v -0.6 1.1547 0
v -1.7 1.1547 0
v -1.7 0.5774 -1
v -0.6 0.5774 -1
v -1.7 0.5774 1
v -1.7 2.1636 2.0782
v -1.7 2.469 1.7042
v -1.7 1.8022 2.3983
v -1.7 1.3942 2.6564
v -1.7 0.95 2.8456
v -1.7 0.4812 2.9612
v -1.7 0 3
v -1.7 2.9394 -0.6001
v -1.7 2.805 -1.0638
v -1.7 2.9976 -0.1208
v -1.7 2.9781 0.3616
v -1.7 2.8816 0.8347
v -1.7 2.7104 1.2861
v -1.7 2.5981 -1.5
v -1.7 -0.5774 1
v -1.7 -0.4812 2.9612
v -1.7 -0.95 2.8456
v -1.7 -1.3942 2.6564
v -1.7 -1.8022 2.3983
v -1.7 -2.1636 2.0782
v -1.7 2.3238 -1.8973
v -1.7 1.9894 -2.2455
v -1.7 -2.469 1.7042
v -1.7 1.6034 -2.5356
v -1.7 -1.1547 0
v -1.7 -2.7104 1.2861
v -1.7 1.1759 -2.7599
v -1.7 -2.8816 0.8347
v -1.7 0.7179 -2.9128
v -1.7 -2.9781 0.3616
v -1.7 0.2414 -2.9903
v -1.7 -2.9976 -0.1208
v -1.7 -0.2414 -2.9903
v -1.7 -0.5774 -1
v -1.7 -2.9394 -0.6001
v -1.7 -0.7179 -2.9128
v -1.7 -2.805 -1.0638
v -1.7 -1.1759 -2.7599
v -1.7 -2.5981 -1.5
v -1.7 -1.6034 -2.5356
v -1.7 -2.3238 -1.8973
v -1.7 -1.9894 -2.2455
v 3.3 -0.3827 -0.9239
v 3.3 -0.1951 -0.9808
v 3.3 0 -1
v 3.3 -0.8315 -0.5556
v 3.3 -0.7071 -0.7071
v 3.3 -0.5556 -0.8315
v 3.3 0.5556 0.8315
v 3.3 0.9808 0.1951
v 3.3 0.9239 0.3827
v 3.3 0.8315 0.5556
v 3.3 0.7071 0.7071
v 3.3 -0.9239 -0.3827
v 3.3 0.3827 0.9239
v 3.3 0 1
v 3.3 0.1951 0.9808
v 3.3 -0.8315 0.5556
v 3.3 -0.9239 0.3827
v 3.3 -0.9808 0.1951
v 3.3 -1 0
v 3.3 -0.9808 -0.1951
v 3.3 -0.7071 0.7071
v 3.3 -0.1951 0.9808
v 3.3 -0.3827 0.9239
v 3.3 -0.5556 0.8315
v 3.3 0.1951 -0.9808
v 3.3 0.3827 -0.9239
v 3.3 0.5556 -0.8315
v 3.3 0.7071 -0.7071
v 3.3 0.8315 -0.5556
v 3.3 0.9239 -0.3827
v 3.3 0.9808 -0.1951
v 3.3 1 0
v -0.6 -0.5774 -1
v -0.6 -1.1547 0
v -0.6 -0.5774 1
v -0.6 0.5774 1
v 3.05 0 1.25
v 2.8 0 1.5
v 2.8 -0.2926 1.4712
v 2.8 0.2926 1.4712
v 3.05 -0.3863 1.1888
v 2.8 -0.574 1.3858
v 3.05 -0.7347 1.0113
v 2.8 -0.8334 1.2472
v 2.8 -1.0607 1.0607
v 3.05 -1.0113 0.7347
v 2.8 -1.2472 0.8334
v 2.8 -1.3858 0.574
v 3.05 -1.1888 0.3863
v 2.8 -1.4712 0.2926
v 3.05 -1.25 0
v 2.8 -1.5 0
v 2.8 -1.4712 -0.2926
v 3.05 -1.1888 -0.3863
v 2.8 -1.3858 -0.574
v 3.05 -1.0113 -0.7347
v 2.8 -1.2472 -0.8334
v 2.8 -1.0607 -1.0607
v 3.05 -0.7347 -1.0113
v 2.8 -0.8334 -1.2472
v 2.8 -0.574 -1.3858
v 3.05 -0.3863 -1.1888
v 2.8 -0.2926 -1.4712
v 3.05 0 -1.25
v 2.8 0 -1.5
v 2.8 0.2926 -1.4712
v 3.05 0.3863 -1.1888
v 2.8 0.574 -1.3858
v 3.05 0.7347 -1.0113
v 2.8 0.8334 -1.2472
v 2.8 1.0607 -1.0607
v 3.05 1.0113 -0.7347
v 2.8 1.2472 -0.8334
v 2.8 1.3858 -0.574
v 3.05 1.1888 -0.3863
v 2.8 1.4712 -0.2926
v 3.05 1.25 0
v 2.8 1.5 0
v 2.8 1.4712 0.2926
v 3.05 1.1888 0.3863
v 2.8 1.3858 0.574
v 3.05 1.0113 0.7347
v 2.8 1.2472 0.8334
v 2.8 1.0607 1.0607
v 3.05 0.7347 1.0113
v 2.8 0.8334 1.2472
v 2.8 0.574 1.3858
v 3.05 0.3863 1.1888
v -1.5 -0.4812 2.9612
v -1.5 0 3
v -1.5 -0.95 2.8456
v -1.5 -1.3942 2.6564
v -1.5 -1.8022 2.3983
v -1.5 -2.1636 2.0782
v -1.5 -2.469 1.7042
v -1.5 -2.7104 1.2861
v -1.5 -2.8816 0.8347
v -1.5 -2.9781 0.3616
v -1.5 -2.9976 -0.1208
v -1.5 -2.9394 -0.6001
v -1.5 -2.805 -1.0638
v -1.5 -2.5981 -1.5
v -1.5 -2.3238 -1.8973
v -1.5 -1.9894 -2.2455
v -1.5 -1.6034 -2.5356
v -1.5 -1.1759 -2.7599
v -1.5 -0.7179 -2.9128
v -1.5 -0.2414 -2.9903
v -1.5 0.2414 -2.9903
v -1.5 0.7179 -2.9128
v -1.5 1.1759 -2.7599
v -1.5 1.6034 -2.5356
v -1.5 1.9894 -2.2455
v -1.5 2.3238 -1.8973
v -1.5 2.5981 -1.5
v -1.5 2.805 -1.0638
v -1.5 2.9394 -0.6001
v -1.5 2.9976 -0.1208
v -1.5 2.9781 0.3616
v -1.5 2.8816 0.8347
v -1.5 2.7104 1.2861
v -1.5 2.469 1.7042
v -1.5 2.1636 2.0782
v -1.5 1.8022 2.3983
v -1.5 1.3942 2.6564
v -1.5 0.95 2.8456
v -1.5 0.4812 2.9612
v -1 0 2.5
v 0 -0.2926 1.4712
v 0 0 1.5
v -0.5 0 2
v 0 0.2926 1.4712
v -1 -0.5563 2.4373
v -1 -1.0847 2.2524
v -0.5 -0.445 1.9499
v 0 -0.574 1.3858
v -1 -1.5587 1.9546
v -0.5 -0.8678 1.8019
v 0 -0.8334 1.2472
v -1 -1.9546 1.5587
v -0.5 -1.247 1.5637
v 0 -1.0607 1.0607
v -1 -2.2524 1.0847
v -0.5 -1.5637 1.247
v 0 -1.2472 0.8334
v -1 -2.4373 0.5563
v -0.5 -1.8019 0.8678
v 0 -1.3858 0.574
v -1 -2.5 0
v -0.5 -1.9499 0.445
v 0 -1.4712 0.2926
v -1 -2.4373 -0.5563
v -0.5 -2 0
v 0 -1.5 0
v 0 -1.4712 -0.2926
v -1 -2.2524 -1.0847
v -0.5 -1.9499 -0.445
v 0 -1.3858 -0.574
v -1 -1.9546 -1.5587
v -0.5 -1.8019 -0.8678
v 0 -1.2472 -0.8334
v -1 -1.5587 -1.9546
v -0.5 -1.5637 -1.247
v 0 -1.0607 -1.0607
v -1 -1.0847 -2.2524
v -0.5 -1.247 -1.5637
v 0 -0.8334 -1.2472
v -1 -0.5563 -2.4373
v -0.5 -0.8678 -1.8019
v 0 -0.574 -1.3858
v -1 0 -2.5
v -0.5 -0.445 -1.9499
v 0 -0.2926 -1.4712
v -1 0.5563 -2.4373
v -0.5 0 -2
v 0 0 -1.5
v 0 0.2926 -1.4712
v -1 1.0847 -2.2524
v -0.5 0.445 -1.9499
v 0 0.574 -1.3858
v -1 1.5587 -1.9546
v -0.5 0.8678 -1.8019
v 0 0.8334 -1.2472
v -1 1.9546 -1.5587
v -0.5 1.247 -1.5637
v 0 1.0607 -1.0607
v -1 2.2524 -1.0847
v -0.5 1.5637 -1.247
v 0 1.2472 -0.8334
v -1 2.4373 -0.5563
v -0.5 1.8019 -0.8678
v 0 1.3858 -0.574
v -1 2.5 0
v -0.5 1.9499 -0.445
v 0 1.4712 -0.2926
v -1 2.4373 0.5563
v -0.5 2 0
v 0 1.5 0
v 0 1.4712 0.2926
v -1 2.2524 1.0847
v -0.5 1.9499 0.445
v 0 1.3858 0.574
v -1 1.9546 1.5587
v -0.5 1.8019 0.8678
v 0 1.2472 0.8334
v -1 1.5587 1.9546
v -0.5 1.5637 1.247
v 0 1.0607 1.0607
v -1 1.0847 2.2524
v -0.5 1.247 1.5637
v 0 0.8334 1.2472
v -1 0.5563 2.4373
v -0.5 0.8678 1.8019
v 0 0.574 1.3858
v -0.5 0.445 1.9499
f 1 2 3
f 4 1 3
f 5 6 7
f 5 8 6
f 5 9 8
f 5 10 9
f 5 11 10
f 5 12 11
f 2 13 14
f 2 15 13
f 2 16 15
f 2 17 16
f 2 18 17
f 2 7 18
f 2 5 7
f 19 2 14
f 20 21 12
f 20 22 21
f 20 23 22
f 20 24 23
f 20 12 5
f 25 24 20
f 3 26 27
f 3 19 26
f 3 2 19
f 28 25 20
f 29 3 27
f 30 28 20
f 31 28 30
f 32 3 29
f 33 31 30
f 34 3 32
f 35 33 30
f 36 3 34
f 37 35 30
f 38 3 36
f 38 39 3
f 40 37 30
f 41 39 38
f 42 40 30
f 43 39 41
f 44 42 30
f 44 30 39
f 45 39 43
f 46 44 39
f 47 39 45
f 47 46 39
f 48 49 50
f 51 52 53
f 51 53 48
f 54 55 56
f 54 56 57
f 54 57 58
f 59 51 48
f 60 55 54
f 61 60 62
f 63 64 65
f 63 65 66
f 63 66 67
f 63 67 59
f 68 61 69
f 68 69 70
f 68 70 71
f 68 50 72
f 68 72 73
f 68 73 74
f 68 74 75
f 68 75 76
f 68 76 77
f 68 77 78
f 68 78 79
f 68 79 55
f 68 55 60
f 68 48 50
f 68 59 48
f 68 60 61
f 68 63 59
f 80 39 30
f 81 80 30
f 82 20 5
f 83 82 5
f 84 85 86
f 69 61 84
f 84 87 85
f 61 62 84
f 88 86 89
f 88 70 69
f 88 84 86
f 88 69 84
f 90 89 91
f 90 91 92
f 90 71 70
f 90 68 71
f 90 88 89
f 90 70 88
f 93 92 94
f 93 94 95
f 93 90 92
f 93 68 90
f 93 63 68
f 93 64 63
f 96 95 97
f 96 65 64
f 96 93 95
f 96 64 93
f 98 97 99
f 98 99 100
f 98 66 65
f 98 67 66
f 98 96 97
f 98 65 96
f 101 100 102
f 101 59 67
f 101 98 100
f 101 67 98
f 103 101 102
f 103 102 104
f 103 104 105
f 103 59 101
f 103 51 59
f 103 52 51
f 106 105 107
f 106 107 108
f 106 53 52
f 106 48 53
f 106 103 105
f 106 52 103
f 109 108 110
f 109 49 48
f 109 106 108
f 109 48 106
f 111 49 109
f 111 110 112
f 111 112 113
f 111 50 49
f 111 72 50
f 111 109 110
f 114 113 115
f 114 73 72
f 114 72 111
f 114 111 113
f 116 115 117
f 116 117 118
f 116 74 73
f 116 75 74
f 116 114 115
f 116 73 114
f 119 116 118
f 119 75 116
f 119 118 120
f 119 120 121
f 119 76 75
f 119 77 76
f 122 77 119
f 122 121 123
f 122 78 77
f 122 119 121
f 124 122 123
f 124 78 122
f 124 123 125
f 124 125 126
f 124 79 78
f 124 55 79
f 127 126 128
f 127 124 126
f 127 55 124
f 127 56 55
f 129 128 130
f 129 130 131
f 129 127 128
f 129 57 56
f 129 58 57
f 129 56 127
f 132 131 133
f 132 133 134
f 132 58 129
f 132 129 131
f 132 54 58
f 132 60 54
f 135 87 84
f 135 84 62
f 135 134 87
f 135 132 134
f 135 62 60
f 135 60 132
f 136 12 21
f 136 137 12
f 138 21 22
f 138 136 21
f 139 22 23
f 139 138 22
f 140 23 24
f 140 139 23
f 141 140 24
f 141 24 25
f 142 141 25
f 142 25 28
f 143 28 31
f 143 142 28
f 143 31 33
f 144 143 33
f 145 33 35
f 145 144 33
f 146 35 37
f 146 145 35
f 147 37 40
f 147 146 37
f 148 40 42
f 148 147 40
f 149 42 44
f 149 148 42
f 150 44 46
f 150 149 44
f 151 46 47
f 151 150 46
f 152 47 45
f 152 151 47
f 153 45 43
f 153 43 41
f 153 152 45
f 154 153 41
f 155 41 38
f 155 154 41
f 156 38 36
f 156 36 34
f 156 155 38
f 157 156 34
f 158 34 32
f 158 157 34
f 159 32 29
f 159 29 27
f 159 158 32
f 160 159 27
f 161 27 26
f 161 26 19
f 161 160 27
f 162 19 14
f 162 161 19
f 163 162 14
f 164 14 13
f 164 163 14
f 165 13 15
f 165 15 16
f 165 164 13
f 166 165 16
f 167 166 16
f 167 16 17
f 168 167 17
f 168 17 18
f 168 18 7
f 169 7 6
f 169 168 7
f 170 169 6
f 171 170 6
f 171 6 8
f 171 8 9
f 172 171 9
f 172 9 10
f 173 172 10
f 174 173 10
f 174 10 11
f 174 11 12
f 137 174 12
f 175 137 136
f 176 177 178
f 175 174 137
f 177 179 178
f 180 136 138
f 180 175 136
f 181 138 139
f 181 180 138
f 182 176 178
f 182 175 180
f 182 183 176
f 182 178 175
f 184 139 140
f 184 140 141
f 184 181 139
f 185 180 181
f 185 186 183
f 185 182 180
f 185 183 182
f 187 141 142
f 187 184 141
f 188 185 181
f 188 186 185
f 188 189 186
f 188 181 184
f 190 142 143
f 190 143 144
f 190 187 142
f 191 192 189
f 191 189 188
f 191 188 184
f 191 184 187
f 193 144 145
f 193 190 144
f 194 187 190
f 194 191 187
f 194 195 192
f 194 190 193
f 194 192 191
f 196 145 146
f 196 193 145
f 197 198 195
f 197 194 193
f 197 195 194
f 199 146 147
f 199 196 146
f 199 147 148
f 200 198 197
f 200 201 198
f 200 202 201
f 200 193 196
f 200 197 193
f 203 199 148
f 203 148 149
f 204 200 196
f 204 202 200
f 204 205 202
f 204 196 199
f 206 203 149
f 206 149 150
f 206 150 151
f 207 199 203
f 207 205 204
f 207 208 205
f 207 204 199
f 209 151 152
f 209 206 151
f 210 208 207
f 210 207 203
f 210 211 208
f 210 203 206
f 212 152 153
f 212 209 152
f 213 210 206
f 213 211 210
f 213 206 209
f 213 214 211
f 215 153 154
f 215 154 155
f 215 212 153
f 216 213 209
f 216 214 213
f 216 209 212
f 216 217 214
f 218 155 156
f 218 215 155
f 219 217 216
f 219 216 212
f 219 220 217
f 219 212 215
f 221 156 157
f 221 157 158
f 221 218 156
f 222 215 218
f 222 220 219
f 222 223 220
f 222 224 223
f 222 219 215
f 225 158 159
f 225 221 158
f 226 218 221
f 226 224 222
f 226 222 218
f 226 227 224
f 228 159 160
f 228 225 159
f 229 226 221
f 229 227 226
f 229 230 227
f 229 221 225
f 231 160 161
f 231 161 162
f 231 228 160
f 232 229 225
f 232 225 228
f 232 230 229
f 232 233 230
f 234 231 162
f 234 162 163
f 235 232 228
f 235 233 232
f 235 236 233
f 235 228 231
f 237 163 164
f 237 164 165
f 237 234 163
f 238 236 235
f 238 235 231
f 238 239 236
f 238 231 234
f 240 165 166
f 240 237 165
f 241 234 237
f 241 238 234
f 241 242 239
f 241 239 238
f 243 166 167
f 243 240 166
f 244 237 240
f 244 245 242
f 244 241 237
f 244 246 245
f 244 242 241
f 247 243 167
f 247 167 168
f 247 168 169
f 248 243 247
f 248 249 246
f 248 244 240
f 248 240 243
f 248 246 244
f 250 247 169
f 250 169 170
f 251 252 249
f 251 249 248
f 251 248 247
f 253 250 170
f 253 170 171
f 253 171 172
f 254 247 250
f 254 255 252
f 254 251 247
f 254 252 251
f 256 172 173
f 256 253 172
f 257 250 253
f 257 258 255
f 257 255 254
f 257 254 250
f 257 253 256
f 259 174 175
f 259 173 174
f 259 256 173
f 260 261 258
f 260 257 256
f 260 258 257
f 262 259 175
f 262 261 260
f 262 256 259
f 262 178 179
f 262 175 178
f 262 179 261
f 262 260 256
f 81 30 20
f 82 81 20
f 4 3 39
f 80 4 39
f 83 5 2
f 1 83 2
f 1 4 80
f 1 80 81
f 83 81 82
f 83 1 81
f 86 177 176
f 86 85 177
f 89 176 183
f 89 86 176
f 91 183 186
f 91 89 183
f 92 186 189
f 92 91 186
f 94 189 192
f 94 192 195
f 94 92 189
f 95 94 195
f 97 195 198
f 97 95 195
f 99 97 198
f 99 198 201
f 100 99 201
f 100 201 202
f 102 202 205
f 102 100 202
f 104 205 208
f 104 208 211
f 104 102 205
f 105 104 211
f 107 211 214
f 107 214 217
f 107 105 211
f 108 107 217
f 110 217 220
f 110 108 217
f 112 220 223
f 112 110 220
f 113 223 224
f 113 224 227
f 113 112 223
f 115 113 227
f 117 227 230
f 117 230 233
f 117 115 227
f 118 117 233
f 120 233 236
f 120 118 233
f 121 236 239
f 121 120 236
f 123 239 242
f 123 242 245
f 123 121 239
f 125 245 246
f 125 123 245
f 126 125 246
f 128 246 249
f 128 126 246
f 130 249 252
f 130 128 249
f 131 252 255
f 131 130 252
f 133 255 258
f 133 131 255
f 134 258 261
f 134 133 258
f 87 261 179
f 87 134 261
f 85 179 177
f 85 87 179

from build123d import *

# Parameters (mm, degrees)
CUT_EXTRUDE1_DEPTH = 1.1


with BuildPart() as part:
    # Sketch1 → Revolve1 (revolve)
    with BuildSketch(Plane.XY, mode=Mode.PRIVATE) as revolve1_sk:
        Polygon((0, -1.5), (2.8, -1.5), (3.3, -1), (3.3, 0), (-1.7, 0), (-1.7, -3), (-1.5, -3), align=None)
    revolve(revolve1_sk.sketch.rotate(Axis((-1.7, 0, 0), (1, 0, 0)), 270), axis=Axis((-1.7, 0, 0), (1, 0, 0)))

    # Sketch2 → Cut-Extrude1 (cut)
    with BuildSketch(Plane.ZY.offset(1.7)):
        Polygon((0, 1.154700538), (-1, 0.577350269), (-1, -0.577350269), (0, -1.154700538), (1, -0.577350269), (1, 0.577350269), align=None)
    extrude(amount=-CUT_EXTRUDE1_DEPTH, mode=Mode.SUBTRACT)


solid = part.part
